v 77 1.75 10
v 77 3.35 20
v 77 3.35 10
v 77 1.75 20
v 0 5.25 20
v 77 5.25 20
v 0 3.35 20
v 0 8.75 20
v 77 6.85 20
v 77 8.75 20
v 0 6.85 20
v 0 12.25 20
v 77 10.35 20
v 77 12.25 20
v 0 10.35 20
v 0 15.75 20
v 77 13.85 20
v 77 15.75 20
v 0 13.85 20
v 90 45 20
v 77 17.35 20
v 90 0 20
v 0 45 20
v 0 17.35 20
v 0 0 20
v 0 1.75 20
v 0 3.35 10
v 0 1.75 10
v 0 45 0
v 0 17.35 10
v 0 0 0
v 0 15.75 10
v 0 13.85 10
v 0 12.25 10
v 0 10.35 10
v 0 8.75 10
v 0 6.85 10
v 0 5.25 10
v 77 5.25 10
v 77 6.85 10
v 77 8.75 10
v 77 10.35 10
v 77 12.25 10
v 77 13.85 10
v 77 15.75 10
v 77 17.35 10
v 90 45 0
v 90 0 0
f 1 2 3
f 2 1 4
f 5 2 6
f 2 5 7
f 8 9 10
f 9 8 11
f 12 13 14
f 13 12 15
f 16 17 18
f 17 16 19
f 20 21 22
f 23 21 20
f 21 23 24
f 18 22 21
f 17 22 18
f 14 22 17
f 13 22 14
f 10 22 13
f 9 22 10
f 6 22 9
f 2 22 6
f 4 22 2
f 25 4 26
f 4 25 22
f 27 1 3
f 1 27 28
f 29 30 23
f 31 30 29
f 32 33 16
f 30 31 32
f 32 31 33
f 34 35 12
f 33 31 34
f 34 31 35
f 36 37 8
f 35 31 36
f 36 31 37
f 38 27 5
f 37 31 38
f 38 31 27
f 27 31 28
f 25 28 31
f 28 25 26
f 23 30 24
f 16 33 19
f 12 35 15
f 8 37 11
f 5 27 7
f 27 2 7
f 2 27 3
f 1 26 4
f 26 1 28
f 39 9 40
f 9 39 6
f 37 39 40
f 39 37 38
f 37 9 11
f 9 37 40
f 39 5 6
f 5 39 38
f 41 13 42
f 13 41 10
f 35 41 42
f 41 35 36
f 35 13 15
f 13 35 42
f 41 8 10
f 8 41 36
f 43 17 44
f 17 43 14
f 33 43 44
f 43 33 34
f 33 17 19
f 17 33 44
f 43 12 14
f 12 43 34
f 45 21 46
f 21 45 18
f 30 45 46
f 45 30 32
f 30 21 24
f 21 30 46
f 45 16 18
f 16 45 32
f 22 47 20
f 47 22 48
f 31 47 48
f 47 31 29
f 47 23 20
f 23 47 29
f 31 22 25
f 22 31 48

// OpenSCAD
// Drying Rack for 10 Microscope Slides
// Base: 90 x 45 x 20 mm
// Slots: 10 parallel slots along X, 77mm long, 1.6mm wide, 10mm deep
// Spacing: 3.5 mm centre-to-centre (Y)
// Group centered on the block in X and Y.

// Base Dimensions
$base_length = 90;
$base_width = 45;
$base_height = 20;

// Slide Dimensions (for verification)
$slide_length = 75;
$slide_width = 25;
$slide_thickness = 1;

// Slot Dimensions
$num_slots = 10;
$slot_length = 77;
$slot_width = 1.6;
$slot_depth = 10;
$slot_spacing = 3.5; // Centre-to-centre in Y

// Extrusion quality for curved corners
$fn = 64;

// Calculate slot positions
// The group of slots must be centered on the block in Y.
// The centers of the 10 slots are spaced by $slot_spacing.
// The distance from the center of the group to the center of the first slot is:
// offset = ( (num_slots - 1) * slot_spacing ) / 2
$slot_center_offset = ( ($num_slots - 1) * $slot_spacing ) / 2;

// Build the base block
difference() {
    // Main Block
    cube([
        $base_length, 
        $base_width, 
        $base_height
    ]);

    // Cut Slots
    for (i = [0 : $num_slots - 1]) {
        // Calculate Y position for this slot center
        $y_pos = -($slot_center_offset) + (i * $slot_spacing);
        
        // Slot geometry: 
        // Length along X: $slot_length
        // Width along Y: $slot_width
        // Depth along Z: $slot_depth
        // Position: X centered (0), Y at $y_pos, Z at top of block ($base_height - $slot_depth)
        
        translate([
            0, 
            $y_pos, 
            $base_height - $slot_depth
        ]) {
            cube([
                $slot_length, 
                $slot_width, 
                $slot_depth
            ]);
        }
    }
}
